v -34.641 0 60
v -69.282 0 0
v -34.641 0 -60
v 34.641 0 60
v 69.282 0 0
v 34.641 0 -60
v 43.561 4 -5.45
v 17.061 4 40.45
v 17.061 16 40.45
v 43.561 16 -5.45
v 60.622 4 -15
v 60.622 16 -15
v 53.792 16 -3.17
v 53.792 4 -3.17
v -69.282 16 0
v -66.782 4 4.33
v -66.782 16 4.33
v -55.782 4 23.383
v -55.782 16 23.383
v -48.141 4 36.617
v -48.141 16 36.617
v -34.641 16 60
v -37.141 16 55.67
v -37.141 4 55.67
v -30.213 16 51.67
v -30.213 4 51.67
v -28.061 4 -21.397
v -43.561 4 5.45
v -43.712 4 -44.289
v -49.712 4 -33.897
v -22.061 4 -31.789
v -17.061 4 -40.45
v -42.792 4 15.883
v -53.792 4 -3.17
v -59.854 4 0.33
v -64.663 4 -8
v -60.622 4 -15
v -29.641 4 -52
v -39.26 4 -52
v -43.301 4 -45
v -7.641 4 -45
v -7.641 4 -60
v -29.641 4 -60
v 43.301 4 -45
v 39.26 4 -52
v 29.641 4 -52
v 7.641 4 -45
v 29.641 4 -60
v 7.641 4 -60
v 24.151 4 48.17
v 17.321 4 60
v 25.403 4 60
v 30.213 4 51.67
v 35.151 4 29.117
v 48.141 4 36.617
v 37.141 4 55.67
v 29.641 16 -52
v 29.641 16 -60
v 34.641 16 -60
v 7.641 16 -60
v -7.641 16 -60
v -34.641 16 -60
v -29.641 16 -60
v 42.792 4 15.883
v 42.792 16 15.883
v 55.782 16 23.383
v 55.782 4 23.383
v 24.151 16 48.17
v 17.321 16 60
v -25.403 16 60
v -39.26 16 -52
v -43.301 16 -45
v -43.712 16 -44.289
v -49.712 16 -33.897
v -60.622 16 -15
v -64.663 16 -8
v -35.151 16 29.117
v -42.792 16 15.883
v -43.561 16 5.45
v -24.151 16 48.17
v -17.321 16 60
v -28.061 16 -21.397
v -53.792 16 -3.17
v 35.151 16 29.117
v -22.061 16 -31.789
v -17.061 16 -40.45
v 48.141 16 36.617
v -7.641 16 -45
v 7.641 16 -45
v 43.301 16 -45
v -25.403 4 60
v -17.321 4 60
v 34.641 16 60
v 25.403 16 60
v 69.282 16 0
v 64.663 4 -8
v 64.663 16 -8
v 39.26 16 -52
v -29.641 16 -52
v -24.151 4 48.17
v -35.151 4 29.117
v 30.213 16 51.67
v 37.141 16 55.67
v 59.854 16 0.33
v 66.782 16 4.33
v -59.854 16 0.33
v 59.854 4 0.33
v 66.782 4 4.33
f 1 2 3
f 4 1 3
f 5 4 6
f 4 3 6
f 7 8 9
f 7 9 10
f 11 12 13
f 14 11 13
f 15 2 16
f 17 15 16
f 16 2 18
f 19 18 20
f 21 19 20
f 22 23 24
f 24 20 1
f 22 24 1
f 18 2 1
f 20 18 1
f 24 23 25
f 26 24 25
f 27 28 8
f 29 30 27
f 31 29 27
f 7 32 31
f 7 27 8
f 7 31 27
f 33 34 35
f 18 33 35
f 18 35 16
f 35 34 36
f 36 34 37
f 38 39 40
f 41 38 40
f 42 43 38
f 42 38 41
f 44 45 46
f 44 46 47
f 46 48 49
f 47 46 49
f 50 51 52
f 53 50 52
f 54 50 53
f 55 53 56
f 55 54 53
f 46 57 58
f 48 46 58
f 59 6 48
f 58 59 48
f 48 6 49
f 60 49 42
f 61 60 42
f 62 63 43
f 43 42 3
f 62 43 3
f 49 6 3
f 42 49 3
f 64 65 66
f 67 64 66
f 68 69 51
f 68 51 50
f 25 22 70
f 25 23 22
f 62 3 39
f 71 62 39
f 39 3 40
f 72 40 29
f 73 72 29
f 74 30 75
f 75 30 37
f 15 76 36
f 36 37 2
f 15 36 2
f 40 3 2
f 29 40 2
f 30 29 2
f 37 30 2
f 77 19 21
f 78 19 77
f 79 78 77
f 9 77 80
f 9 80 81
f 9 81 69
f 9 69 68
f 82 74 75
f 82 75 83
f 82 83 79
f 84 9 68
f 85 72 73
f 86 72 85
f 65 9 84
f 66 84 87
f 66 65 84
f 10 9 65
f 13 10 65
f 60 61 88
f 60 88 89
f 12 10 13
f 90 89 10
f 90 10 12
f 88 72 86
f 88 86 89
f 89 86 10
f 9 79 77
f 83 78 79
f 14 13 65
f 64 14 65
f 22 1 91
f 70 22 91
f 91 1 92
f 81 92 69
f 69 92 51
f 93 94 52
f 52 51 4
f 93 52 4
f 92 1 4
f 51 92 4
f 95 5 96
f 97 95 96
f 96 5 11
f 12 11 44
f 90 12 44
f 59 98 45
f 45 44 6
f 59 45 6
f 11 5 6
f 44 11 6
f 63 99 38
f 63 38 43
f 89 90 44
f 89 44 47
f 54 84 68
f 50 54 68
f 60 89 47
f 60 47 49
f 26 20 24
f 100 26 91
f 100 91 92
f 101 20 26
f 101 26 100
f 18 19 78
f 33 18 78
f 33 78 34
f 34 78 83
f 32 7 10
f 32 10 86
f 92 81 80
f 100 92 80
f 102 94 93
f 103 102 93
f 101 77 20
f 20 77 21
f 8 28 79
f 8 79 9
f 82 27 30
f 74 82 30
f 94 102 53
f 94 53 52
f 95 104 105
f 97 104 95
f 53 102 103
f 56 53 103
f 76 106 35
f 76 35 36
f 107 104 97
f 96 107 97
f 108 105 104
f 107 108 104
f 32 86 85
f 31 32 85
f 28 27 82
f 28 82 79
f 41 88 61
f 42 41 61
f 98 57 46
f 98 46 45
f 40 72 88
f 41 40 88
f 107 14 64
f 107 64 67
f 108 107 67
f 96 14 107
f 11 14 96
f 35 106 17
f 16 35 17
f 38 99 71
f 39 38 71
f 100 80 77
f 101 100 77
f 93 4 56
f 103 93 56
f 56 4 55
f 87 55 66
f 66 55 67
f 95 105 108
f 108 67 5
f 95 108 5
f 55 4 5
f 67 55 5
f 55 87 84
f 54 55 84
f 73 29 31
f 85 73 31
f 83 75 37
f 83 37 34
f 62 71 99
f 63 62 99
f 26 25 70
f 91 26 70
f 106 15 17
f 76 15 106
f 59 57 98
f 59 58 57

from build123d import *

# Parameters (mm, degrees)
BOSS_EXTRUDE1_DEPTH     = 16
SKETCH2_W               = 22
SKETCH2_H               = 15
CUT_EXTRUDE1_DEPTH      = 12
CUT_EXTRUDE2_DEPTH      = 94.037626797
CUT_EXTRUDE2_DEPTH_BACK = 12
CUT_EXTRUDE4_DEPTH      = 12


with BuildPart() as part:
    # Sketch1 → Boss-Extrude1 (new body)
    with BuildSketch(Plane(origin=(0, 0, 0), x_dir=(1, 0, 0), z_dir=(0, 1, 0))):
        Polygon((69.282032303, 0), (34.641016151, 60), (-34.641016151, 60), (-69.282032303, 0), (-34.641016151, -60), (34.641016151, -60), align=None)
    extrude(amount=BOSS_EXTRUDE1_DEPTH)

    # Sketch2 → Cut-Extrude1 (cut)
    with BuildSketch(Plane(origin=(0, 16, 0), x_dir=(1, 0, 0), z_dir=(0, 1, 0))):
        with Locations((-18.641016151, 52.5)):
            Rectangle(SKETCH2_W, SKETCH2_H)
        with Locations((18.641016151, 52.5)):
            Rectangle(SKETCH2_W, SKETCH2_H)
        Polygon((66.782032303, -4.330127019), (53.791651246, 3.169872981), (42.791651246, -15.882685902), (55.782032303, -23.382685902), align=None)
        Polygon((48.141016151, -36.617314098), (35.150635095, -29.117314098), (24.150635095, -48.169872981), (37.141016151, -55.669872981), align=None)
        Polygon((-37.141016151, -55.669872981), (-24.150635095, -48.169872981), (-35.150635095, -29.117314098), (-48.141016151, -36.617314098), align=None)
        Polygon((-55.782032303, -23.382685902), (-42.791651246, -15.882685902), (-53.791651246, 3.169872981), (-66.782032303, -4.330127019), align=None)
    extrude(amount=-CUT_EXTRUDE1_DEPTH, mode=Mode.SUBTRACT)

    # Sketch3 → Cut-Extrude2 (cut, two sides: drawn at the far end of the back side and taken through both)
    with BuildSketch(Plane(origin=(0, 16, 0), x_dir=(1, 0, 0), z_dir=(0, 1, 0)).offset(-CUT_EXTRUDE2_DEPTH_BACK)):
        Polygon((-43.560889132, -5.4496732), (17.060889132, -40.4496732), (43.560889132, 5.4496732), (-17.060889132, 40.4496732), align=None)
        Polygon((-22.060889132, 31.789419162), (-28.060889132, 21.397114317), (-49.711524227, 33.897114317), (-43.711524227, 44.289419162), align=None)
    extrude(amount=CUT_EXTRUDE2_DEPTH + CUT_EXTRUDE2_DEPTH_BACK, mode=Mode.SUBTRACT)

    # Sketch4 → Cut-Extrude4 (cut)
    with BuildSketch(Plane(origin=(0, 16, 0), x_dir=(1, 0, 0), z_dir=(0, 1, 0))):
        Polygon((-53.791651246, 3.169872981), (-59.853829072, -0.330127019), (-64.663230149, 8), (-60.621778265, 15), align=None)
        Polygon((-24.150635095, -48.169872981), (-30.212812921, -51.669872981), (-25.403411844, -60), (-17.320508076, -60), align=None)
        Polygon((43.301270189, 45), (29.641016151, 45), (29.641016151, 52), (39.259818305, 52), align=None)
        Polygon((-43.301270189, 45), (-29.641016151, 45), (-29.641016151, 52), (-39.259818305, 52), align=None)
        Polygon((17.320508076, -60), (24.150635095, -48.169872981), (30.212812921, -51.669872981), (25.403411844, -60), align=None)
        Polygon((60.621778265, 15), (53.791651246, 3.169872981), (59.853829072, -0.330127019), (64.663230149, 8), align=None)
    extrude(amount=-CUT_EXTRUDE4_DEPTH, mode=Mode.SUBTRACT)


solid = part.part
